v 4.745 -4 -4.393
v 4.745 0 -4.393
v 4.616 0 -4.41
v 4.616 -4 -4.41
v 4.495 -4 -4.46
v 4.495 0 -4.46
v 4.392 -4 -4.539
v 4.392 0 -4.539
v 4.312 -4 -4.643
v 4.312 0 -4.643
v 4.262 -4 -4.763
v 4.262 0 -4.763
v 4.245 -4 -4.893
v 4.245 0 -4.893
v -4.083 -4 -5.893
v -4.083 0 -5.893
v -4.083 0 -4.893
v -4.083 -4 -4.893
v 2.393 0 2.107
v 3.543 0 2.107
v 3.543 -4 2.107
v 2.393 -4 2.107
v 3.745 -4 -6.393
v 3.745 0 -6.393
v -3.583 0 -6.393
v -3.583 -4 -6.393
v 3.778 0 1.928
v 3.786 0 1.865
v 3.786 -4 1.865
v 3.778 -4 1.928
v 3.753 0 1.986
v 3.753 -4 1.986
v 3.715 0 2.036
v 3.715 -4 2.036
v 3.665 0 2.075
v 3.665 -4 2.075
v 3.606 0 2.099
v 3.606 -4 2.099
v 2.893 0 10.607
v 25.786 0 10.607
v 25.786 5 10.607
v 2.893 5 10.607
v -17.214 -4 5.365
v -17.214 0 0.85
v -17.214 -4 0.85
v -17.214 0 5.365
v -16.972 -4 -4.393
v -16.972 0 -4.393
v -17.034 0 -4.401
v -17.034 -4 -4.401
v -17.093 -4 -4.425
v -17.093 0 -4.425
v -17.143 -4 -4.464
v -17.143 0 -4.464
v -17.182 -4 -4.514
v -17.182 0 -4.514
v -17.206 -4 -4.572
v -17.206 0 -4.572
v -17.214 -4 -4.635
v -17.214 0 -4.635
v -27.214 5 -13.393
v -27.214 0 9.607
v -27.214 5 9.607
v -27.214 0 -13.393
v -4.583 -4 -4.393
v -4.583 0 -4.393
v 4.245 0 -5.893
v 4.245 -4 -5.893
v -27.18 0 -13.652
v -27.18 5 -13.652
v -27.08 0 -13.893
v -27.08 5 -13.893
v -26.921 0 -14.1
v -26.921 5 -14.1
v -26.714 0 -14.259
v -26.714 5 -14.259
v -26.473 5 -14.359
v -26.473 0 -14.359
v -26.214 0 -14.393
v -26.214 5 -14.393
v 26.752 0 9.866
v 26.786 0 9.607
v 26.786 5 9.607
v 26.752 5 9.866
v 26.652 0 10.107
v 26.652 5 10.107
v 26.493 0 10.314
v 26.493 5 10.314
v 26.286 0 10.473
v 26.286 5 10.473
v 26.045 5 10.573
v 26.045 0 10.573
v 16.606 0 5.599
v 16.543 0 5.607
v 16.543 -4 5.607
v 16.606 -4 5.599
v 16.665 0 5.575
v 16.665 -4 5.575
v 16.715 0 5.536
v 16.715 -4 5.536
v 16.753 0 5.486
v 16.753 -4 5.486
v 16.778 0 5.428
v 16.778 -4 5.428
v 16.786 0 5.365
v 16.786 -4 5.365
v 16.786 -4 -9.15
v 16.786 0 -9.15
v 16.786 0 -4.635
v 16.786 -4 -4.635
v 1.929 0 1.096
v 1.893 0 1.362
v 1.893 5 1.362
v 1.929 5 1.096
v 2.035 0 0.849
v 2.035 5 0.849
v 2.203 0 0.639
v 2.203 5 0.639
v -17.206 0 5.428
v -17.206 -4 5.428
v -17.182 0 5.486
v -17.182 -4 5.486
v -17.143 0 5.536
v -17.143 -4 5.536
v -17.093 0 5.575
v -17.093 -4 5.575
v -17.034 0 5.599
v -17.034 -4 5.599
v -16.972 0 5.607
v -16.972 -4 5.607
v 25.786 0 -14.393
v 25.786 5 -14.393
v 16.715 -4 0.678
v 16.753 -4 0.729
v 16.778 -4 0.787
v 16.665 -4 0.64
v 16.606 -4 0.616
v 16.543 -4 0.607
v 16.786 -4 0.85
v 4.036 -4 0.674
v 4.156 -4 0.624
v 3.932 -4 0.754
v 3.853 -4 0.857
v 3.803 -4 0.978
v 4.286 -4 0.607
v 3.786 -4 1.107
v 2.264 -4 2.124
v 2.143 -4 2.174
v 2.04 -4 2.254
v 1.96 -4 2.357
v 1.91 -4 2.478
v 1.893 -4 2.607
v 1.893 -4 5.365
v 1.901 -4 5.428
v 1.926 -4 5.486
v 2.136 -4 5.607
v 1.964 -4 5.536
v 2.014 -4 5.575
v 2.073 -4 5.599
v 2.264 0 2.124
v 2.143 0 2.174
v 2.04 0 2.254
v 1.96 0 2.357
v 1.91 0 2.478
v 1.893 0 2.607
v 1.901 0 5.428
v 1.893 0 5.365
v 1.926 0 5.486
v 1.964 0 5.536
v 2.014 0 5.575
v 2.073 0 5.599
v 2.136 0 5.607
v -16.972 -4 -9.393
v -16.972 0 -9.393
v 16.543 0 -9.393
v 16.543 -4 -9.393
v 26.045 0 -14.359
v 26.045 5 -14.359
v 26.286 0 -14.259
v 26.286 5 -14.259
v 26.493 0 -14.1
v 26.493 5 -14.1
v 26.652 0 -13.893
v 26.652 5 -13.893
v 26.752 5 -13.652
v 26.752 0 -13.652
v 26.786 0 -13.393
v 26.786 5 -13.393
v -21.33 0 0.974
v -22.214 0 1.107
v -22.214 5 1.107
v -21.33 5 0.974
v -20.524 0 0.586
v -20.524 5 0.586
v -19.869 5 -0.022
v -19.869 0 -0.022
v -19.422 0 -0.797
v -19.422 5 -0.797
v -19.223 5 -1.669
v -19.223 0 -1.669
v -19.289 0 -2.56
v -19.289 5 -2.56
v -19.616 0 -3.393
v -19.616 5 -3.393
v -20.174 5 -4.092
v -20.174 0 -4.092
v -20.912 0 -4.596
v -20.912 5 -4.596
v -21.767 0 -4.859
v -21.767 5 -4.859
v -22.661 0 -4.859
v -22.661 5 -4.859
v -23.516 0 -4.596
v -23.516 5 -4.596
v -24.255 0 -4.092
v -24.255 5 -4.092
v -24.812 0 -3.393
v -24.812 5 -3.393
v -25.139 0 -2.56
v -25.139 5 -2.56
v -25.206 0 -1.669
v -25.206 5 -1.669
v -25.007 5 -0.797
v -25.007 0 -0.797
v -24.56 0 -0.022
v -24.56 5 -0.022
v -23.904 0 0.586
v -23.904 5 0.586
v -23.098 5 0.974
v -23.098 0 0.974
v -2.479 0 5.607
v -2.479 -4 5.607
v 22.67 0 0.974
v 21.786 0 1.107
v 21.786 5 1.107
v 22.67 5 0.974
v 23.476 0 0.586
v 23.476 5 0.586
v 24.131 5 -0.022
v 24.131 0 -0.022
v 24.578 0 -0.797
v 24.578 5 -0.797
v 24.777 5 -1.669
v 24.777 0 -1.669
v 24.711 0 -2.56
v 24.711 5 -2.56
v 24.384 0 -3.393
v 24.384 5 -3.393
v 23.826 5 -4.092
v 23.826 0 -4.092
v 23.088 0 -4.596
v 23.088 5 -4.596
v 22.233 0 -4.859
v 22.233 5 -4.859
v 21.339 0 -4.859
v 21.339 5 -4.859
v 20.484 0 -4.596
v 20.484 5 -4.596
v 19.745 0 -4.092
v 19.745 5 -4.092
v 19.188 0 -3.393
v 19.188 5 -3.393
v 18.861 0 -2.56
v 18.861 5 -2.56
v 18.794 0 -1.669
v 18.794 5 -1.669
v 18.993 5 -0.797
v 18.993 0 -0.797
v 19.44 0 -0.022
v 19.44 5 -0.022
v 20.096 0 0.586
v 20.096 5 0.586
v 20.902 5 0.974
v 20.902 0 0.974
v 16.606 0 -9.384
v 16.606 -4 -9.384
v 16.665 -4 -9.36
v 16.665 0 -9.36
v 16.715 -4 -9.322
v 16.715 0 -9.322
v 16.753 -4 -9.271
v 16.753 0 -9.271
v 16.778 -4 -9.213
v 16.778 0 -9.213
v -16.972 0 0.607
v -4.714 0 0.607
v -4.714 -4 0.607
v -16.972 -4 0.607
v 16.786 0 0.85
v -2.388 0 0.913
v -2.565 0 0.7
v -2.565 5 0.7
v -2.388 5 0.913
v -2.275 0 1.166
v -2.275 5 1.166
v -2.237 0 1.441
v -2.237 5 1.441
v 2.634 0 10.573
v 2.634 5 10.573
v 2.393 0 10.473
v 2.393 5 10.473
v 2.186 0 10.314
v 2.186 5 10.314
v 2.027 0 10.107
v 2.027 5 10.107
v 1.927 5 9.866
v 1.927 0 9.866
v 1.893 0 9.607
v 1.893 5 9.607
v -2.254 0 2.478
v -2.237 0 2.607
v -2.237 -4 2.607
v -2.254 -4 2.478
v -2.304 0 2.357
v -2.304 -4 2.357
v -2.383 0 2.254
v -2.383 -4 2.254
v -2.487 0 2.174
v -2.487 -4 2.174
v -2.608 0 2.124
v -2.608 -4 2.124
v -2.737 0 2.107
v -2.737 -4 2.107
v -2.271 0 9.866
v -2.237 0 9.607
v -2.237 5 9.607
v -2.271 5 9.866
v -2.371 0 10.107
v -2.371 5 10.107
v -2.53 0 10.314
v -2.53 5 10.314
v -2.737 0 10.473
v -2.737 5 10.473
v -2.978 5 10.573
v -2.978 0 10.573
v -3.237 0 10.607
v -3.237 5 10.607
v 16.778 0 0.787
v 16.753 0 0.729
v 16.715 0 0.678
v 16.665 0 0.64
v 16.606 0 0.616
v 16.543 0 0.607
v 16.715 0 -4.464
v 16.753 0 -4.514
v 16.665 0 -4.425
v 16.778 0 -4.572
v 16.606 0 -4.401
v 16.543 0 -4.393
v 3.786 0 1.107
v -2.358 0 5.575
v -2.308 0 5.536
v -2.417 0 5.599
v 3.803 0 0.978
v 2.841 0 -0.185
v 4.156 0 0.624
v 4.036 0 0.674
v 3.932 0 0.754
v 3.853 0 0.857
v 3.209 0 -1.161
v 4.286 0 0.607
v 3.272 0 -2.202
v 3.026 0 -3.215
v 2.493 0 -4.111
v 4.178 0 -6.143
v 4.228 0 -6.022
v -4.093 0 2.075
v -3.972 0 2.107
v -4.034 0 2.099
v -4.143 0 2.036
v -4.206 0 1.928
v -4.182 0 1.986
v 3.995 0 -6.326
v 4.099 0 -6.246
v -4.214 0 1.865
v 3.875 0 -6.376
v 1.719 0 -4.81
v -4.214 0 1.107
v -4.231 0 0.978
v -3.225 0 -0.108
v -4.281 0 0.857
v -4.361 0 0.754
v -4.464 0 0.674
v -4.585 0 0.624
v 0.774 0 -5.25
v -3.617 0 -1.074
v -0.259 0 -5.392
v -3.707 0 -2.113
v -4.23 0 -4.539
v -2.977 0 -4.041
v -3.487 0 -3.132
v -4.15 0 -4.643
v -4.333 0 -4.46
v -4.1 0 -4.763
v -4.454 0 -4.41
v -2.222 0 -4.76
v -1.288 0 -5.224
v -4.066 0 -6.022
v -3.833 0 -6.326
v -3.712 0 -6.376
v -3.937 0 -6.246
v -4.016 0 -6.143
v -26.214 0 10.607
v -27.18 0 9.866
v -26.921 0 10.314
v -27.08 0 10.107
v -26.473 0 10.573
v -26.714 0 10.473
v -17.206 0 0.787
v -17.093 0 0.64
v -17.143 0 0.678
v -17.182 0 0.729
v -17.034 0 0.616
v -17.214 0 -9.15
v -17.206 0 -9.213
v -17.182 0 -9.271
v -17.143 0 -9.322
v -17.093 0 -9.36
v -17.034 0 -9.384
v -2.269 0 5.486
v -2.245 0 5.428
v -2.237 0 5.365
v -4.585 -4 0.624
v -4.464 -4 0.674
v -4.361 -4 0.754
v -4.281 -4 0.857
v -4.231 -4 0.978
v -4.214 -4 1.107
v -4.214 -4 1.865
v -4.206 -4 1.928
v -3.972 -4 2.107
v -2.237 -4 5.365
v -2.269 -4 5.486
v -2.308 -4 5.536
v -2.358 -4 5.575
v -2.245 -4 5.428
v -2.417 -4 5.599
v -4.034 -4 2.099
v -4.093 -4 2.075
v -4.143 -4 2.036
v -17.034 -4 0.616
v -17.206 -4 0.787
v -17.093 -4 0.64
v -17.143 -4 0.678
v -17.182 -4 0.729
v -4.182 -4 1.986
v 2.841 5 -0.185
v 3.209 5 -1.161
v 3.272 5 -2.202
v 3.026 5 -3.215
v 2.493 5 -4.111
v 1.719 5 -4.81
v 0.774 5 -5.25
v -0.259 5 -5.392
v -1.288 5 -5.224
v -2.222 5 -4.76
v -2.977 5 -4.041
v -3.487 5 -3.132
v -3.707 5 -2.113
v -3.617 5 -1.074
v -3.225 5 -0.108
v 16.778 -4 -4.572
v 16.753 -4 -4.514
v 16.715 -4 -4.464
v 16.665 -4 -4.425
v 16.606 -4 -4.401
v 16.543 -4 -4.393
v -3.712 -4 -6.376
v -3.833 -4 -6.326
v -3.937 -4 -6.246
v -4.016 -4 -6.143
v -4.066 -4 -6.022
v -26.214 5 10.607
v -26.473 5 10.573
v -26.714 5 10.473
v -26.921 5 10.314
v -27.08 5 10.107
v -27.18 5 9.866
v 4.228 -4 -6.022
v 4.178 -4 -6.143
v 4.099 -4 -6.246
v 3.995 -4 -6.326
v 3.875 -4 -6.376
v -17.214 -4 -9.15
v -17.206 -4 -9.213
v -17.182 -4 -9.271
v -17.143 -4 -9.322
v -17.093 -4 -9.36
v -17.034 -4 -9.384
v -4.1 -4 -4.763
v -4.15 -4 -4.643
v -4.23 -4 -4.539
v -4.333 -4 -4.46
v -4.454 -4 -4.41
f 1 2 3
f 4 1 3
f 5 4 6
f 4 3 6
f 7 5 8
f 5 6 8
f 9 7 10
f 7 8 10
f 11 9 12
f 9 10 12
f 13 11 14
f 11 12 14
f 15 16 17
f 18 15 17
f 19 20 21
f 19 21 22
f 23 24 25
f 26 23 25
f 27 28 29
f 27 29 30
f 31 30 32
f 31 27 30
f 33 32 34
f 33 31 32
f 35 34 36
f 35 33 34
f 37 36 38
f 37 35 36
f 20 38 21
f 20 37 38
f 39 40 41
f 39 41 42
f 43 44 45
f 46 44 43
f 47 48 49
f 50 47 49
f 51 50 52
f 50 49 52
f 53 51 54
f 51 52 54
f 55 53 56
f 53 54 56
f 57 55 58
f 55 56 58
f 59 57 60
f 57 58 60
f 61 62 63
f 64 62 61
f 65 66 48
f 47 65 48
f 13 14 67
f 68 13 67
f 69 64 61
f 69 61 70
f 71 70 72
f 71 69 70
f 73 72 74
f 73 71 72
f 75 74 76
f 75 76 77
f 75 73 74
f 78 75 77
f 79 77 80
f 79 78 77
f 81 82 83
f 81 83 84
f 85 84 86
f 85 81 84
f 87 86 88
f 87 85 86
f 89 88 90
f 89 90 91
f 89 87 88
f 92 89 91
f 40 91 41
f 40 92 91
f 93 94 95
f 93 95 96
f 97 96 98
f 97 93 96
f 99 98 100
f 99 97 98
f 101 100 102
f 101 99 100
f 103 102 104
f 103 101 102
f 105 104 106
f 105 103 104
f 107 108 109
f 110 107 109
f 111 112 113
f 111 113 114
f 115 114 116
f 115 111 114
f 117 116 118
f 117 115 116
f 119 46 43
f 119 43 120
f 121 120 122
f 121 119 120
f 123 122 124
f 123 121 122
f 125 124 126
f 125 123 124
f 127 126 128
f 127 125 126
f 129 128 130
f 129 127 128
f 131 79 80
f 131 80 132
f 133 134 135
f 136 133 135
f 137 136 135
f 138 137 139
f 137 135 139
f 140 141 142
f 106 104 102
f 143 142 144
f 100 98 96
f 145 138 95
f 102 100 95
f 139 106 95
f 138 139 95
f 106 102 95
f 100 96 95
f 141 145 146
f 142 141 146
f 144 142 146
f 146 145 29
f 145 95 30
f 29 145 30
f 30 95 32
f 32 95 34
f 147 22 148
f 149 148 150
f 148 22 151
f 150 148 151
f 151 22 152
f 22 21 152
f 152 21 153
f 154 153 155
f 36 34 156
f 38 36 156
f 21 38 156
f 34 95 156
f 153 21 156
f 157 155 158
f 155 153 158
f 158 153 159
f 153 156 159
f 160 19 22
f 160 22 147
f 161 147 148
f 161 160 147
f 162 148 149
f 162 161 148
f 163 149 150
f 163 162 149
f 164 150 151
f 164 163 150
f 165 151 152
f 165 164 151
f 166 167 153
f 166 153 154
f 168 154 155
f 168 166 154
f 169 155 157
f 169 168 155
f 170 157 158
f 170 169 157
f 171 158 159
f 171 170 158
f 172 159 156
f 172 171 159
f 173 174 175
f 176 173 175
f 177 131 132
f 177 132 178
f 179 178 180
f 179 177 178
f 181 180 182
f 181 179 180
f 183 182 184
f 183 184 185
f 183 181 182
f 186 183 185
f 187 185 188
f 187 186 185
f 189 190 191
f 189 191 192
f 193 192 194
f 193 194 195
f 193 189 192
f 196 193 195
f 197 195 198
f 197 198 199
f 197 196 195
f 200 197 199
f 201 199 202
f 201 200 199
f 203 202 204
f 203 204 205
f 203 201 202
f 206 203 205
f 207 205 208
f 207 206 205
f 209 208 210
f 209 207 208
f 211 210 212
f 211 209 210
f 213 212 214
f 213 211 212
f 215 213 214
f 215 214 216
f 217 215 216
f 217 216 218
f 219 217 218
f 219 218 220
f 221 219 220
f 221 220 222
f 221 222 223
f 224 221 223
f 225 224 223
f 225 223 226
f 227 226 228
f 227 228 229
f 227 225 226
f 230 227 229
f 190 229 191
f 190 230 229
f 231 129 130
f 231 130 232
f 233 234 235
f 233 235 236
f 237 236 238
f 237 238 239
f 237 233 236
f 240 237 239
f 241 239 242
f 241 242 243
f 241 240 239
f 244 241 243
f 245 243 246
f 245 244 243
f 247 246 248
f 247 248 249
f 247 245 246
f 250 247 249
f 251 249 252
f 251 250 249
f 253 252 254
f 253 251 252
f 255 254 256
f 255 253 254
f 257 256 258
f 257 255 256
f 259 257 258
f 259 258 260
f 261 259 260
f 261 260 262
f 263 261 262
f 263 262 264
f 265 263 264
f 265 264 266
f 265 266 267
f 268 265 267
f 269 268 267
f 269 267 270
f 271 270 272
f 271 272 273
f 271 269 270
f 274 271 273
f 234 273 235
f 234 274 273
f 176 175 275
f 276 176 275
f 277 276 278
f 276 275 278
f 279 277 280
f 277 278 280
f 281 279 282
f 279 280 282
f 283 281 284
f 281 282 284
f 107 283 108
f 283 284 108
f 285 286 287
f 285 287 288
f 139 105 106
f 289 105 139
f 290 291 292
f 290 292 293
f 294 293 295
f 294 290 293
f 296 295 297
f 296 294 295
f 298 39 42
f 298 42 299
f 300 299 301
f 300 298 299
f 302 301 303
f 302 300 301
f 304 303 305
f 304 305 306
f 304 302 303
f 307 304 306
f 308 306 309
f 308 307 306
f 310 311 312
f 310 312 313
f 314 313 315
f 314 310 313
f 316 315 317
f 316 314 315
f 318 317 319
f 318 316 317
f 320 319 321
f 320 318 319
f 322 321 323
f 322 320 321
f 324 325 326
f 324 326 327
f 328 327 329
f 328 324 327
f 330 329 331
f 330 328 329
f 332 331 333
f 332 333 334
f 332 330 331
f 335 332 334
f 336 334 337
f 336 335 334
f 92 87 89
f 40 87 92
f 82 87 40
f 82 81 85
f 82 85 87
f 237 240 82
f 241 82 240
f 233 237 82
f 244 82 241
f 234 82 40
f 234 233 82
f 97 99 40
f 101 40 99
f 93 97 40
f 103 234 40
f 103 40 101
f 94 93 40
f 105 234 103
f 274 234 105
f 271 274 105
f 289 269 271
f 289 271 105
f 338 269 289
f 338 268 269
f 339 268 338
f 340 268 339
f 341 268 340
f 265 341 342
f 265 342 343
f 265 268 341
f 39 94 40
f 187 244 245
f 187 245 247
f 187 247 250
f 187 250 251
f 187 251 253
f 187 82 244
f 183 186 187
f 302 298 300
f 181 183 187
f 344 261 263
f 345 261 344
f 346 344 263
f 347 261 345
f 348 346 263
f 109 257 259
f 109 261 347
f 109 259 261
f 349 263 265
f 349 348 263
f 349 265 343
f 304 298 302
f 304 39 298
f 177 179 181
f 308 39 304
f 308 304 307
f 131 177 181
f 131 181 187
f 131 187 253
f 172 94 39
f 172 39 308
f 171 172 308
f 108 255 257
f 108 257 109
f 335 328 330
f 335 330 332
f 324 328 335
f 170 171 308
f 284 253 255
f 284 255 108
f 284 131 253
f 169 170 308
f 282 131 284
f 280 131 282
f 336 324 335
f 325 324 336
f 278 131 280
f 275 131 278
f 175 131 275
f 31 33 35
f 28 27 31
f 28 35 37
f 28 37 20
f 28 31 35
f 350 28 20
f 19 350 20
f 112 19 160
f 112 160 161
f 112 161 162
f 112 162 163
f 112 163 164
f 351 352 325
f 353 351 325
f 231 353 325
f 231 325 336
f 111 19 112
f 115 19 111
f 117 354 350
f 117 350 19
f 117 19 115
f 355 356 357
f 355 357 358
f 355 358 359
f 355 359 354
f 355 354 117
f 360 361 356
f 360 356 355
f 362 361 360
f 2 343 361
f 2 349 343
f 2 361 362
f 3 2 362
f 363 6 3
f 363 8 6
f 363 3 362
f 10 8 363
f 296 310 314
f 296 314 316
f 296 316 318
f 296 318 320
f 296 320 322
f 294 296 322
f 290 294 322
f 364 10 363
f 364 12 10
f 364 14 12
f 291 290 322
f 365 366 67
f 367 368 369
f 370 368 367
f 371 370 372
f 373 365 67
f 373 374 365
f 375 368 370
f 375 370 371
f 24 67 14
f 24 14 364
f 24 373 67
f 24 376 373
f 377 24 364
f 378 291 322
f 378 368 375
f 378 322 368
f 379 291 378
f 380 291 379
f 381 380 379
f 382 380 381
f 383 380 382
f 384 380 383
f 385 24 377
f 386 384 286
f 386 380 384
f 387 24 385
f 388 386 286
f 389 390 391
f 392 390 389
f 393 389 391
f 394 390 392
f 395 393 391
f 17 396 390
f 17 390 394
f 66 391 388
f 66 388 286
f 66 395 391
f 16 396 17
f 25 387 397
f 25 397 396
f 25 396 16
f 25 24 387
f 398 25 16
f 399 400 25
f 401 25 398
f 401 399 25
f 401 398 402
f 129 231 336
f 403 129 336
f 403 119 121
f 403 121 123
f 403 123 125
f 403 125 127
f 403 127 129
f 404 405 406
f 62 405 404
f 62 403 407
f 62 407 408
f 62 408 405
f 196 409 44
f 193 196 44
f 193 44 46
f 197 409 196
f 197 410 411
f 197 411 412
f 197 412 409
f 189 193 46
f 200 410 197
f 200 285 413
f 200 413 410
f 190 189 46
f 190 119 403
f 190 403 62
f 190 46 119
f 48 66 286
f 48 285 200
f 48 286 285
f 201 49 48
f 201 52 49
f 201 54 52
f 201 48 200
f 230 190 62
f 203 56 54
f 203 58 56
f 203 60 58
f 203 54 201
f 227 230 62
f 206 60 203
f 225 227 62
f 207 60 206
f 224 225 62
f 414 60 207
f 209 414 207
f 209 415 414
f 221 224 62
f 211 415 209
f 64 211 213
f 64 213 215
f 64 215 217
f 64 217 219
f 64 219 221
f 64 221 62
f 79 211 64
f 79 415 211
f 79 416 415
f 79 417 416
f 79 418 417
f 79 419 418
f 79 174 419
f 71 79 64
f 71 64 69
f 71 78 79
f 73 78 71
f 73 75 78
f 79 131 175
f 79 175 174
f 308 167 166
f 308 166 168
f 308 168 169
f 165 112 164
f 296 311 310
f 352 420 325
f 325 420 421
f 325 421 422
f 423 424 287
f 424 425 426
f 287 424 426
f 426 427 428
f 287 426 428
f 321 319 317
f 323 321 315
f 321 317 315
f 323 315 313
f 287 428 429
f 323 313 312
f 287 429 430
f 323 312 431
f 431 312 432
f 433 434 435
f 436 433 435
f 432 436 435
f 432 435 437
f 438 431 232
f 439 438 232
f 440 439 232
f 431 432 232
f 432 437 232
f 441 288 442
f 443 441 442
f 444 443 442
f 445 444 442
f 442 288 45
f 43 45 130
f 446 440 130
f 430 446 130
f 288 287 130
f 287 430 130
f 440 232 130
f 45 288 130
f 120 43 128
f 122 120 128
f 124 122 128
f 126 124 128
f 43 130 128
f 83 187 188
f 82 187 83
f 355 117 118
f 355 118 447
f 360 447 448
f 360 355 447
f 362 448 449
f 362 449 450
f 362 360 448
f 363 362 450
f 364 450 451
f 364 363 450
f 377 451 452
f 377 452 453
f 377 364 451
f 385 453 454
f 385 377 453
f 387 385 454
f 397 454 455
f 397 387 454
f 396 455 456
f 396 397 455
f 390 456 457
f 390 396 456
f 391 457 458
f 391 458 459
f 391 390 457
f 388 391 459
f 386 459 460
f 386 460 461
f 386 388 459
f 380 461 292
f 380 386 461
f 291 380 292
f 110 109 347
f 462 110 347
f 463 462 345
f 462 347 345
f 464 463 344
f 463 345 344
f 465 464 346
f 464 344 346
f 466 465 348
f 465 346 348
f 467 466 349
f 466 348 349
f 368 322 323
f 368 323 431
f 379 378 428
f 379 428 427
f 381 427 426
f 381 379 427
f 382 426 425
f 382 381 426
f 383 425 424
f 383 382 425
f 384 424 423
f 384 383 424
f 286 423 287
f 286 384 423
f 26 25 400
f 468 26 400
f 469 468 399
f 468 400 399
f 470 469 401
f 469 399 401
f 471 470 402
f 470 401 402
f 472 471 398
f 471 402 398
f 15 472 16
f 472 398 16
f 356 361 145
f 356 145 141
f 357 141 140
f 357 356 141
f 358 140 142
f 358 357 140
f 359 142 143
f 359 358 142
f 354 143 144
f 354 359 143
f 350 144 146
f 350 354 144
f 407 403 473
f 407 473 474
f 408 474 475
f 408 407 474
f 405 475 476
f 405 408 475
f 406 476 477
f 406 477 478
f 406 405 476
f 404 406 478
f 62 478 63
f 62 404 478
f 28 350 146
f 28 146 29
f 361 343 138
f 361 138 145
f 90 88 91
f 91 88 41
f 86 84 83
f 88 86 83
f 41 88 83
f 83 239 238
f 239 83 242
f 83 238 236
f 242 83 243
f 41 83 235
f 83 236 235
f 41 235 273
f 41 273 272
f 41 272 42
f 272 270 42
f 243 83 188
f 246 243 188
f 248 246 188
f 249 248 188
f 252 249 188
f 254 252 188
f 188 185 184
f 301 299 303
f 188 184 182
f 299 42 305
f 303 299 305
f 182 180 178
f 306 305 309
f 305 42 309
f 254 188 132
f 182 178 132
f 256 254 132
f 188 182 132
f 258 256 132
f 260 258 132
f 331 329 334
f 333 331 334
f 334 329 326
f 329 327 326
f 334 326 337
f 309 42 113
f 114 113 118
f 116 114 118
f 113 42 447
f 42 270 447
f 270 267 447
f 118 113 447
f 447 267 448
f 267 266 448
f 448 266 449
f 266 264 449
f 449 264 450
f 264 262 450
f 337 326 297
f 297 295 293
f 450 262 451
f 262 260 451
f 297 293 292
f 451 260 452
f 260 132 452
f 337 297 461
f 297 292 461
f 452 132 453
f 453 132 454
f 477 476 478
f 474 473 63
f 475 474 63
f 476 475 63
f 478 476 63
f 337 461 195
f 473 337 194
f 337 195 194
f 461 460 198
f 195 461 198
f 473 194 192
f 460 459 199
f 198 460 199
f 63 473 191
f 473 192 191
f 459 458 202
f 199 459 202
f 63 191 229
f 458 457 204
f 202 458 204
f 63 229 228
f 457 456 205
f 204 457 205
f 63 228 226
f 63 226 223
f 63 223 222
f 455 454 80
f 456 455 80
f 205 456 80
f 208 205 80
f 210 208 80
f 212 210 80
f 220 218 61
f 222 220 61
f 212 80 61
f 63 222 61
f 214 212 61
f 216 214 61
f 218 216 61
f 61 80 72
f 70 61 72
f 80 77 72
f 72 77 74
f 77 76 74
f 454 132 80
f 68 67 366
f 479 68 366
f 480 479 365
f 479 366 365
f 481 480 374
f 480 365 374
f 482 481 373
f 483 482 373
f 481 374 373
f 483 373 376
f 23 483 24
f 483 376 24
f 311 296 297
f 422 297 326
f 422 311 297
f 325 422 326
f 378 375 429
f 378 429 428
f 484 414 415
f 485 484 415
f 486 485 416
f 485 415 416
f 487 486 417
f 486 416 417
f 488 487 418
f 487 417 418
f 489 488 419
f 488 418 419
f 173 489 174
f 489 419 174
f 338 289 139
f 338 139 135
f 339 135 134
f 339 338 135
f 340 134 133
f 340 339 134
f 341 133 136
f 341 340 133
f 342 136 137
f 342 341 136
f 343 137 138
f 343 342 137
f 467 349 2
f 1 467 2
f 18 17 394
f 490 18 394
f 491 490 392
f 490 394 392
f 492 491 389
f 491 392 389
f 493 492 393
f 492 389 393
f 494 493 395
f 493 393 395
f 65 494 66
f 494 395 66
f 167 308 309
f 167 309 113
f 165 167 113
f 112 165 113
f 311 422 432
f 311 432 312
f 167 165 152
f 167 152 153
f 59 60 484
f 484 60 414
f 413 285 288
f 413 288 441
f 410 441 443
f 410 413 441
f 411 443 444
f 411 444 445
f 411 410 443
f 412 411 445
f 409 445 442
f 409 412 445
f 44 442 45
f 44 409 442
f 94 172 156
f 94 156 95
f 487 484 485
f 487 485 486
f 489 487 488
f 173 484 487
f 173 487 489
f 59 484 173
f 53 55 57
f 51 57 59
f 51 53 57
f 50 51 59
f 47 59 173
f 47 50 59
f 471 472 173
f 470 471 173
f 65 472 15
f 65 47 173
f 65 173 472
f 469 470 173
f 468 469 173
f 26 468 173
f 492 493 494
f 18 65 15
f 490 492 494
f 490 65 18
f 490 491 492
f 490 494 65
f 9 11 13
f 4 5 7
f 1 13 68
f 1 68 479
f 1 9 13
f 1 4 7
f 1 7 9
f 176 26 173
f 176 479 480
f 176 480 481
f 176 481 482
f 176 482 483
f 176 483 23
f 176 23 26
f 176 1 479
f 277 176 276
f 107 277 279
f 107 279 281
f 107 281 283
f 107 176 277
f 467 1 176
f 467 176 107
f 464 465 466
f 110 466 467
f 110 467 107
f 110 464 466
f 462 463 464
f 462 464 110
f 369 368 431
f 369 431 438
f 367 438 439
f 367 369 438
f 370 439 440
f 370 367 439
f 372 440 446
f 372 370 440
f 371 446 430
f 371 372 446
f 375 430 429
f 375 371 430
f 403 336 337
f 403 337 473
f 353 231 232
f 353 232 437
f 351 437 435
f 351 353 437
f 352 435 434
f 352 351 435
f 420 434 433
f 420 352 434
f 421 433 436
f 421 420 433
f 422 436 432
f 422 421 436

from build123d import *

# Parameters (mm, degrees)
SKETCH1_R           = 3
BOSS_EXTRUDE1_DEPTH = 5
BOSS_EXTRUDE2_DEPTH = 4


with BuildPart() as part:
    # Sketch1 → Boss-Extrude1 (new body)
    with BuildSketch(Plane(origin=(0, 0, 0), x_dir=(1, 0, 0), z_dir=(0, 1, 0))):
        with BuildLine():
            Line((-26.214135995, 14.392719194), (25.785864005, 14.392719194))
            ThreePointArc((25.785864005, 14.392719194), (26.492970786, 14.099825975), (26.785864005, 13.392719194))
            Line((26.785864005, 13.392719194), (26.785864005, -9.607280806))
            ThreePointArc((26.785864005, -9.607280806), (26.492970786, -10.314387587), (25.785864005, -10.607280806))
            Line((25.785864005, -10.607280806), (2.893081301, -10.607280806))
            ThreePointArc((2.893081301, -10.607280806), (2.18597452, -10.314387587), (1.893081301, -9.607280806))
            Line((1.893081301, -9.607280806), (1.893081301, -1.362307791))
            ThreePointArc((1.893081301, -1.362307791), (1.97370849, -0.968920407), (2.202588568, -0.638968461))
            ThreePointArc((2.202588568, -0.638968461), (-0.258950026, 5.392432282), (-2.565241962, -0.700020811))
            ThreePointArc((-2.565241962, -0.700020811), (-2.322726014, -1.035676875), (-2.236986524, -1.440803669))
            Line((-2.236986524, -1.440803669), (-2.236986524, -9.607280806))
            ThreePointArc((-2.236986524, -9.607280806), (-2.529879743, -10.314387587), (-3.236986524, -10.607280806))
            Line((-3.236986524, -10.607280806), (-26.214135995, -10.607280806))
            ThreePointArc((-26.214135995, -10.607280806), (-26.921242776, -10.314387587), (-27.214135995, -9.607280806))
            Line((-27.214135995, -9.607280806), (-27.214135995, 13.392719194))
            ThreePointArc((-27.214135995, 13.392719194), (-26.921242776, 14.099825975), (-26.214135995, 14.392719194))
        make_face()
        with Locations(Location((-22.214135995, 1.892719194, 0), (0, 0, 270))):
            Circle(SKETCH1_R, mode=Mode.SUBTRACT)
        with Locations(Location((21.785864005, 1.892719194, 0), (0, 0, 270))):
            Circle(SKETCH1_R, mode=Mode.SUBTRACT)
    extrude(amount=BOSS_EXTRUDE1_DEPTH)

    # 3DSketch1 → Boss-Extrude2 (add)
    with BuildSketch(Plane(origin=(4.245395627, 0, -4.892719194), x_dir=(-0.9022274497491443, 0, 0.43126051166221485), z_dir=(0, 1, 0))):
        with BuildLine():
            Line((0, 0), (-0.431260512, -0.90222745))
            ThreePointArc((-0.431260512, -0.90222745), (-0.451605977, -1.284369663), (-0.195777043, -1.56897143))
            Line((-0.195777043, -1.56897143), (6.416167911, -4.72945027))
            ThreePointArc((6.416167911, -4.72945027), (6.798310124, -4.749795735), (7.082911891, -4.493966801))
            Line((7.082911891, -4.493966801), (7.514172403, -3.591739351))
            ThreePointArc((7.514172403, -3.591739351), (7.79877417, -3.335910417), (8.180916384, -3.356255882))
            Line((8.180916384, -3.356255882), (19.358269109, -8.698978337))
            ThreePointArc((19.358269109, -8.698978337), (19.482317491, -8.836978321), (19.472452219, -9.022274497))
            Line((19.472452219, -9.022274497), (17.525262711, -13.095932476))
            ThreePointArc((17.525262711, -13.095932476), (17.387262727, -13.219980858), (17.201966551, -13.210115586))
            Line((17.201966551, -13.210115586), (-13.036287471, 1.24362876))
            ThreePointArc((-13.036287471, 1.24362876), (-13.160335853, 1.381628744), (-13.150470581, 1.56692492))
            Line((-13.150470581, 1.56692492), (-11.203281073, 5.640582899))
            ThreePointArc((-11.203281073, 5.640582899), (-11.065281089, 5.764631281), (-10.879984912, 5.754766009))
            Line((-10.879984912, 5.754766009), (-0.235483469, 0.666743981))
            ThreePointArc((-0.235483469, 0.666743981), (0.020345465, 0.382142214), (0, 0))
        make_face()
        with BuildLine():
            Line((-8.723682354, 10.265903258), (2.335421133, 4.979703387))
            ThreePointArc((2.335421133, 4.979703387), (2.717563346, 4.959357922), (3.002165113, 5.215186856))
            Line((3.002165113, 5.215186856), (3.3288691, 5.898674671))
            ThreePointArc((3.3288691, 5.898674671), (3.466869084, 6.022723053), (3.65216526, 6.012857781))
            Line((3.65216526, 6.012857781), (4.690032412, 5.516762124))
            ThreePointArc((4.690032412, 5.516762124), (5.072174626, 5.496416659), (5.356776393, 5.752245593))
            Line((5.356776393, 5.752245593), (6.546001403, 8.240188308))
            ThreePointArc((6.546001403, 8.240188308), (6.555866675, 8.425484484), (6.431818293, 8.563484468))
            Line((6.431818293, 8.563484468), (-6.567379796, 14.777040507))
            ThreePointArc((-6.567379796, 14.777040507), (-6.752675972, 14.786905779), (-6.890675956, 14.662857397))
            Line((-6.890675956, 14.662857397), (-8.837865464, 10.589199418))
            ThreePointArc((-8.837865464, 10.589199418), (-8.847730736, 10.403903241), (-8.723682354, 10.265903258))
        make_face()
        with BuildLine():
            Line((21.837867827, -4.073657979), (23.785057336, 0))
            ThreePointArc((23.785057336, 0), (23.794922608, 0.185296176), (23.670874226, 0.32329616))
            Line((23.670874226, 0.32329616), (10.595558124, 6.573236254))
            ThreePointArc((10.595558124, 6.573236254), (10.410261948, 6.583101526), (10.272261964, 6.459053144))
            Line((10.272261964, 6.459053144), (9.083036954, 3.97111043))
            ThreePointArc((9.083036954, 3.97111043), (9.062691489, 3.588968216), (9.318520423, 3.304366449))
            Line((9.318520423, 3.304366449), (10.432505588, 2.771886738))
            ThreePointArc((10.432505588, 2.771886738), (10.55655397, 2.633886754), (10.546688698, 2.448590577))
            Line((10.546688698, 2.448590577), (10.219984711, 1.765102763))
            ThreePointArc((10.219984711, 1.765102763), (10.199639246, 1.382960549), (10.45546818, 1.098358782))
            Line((10.45546818, 1.098358782), (21.514571667, -4.187841089))
            ThreePointArc((21.514571667, -4.187841089), (21.699867844, -4.197706361), (21.837867827, -4.073657979))
        make_face()
    extrude(amount=-BOSS_EXTRUDE2_DEPTH)


solid = part.part
